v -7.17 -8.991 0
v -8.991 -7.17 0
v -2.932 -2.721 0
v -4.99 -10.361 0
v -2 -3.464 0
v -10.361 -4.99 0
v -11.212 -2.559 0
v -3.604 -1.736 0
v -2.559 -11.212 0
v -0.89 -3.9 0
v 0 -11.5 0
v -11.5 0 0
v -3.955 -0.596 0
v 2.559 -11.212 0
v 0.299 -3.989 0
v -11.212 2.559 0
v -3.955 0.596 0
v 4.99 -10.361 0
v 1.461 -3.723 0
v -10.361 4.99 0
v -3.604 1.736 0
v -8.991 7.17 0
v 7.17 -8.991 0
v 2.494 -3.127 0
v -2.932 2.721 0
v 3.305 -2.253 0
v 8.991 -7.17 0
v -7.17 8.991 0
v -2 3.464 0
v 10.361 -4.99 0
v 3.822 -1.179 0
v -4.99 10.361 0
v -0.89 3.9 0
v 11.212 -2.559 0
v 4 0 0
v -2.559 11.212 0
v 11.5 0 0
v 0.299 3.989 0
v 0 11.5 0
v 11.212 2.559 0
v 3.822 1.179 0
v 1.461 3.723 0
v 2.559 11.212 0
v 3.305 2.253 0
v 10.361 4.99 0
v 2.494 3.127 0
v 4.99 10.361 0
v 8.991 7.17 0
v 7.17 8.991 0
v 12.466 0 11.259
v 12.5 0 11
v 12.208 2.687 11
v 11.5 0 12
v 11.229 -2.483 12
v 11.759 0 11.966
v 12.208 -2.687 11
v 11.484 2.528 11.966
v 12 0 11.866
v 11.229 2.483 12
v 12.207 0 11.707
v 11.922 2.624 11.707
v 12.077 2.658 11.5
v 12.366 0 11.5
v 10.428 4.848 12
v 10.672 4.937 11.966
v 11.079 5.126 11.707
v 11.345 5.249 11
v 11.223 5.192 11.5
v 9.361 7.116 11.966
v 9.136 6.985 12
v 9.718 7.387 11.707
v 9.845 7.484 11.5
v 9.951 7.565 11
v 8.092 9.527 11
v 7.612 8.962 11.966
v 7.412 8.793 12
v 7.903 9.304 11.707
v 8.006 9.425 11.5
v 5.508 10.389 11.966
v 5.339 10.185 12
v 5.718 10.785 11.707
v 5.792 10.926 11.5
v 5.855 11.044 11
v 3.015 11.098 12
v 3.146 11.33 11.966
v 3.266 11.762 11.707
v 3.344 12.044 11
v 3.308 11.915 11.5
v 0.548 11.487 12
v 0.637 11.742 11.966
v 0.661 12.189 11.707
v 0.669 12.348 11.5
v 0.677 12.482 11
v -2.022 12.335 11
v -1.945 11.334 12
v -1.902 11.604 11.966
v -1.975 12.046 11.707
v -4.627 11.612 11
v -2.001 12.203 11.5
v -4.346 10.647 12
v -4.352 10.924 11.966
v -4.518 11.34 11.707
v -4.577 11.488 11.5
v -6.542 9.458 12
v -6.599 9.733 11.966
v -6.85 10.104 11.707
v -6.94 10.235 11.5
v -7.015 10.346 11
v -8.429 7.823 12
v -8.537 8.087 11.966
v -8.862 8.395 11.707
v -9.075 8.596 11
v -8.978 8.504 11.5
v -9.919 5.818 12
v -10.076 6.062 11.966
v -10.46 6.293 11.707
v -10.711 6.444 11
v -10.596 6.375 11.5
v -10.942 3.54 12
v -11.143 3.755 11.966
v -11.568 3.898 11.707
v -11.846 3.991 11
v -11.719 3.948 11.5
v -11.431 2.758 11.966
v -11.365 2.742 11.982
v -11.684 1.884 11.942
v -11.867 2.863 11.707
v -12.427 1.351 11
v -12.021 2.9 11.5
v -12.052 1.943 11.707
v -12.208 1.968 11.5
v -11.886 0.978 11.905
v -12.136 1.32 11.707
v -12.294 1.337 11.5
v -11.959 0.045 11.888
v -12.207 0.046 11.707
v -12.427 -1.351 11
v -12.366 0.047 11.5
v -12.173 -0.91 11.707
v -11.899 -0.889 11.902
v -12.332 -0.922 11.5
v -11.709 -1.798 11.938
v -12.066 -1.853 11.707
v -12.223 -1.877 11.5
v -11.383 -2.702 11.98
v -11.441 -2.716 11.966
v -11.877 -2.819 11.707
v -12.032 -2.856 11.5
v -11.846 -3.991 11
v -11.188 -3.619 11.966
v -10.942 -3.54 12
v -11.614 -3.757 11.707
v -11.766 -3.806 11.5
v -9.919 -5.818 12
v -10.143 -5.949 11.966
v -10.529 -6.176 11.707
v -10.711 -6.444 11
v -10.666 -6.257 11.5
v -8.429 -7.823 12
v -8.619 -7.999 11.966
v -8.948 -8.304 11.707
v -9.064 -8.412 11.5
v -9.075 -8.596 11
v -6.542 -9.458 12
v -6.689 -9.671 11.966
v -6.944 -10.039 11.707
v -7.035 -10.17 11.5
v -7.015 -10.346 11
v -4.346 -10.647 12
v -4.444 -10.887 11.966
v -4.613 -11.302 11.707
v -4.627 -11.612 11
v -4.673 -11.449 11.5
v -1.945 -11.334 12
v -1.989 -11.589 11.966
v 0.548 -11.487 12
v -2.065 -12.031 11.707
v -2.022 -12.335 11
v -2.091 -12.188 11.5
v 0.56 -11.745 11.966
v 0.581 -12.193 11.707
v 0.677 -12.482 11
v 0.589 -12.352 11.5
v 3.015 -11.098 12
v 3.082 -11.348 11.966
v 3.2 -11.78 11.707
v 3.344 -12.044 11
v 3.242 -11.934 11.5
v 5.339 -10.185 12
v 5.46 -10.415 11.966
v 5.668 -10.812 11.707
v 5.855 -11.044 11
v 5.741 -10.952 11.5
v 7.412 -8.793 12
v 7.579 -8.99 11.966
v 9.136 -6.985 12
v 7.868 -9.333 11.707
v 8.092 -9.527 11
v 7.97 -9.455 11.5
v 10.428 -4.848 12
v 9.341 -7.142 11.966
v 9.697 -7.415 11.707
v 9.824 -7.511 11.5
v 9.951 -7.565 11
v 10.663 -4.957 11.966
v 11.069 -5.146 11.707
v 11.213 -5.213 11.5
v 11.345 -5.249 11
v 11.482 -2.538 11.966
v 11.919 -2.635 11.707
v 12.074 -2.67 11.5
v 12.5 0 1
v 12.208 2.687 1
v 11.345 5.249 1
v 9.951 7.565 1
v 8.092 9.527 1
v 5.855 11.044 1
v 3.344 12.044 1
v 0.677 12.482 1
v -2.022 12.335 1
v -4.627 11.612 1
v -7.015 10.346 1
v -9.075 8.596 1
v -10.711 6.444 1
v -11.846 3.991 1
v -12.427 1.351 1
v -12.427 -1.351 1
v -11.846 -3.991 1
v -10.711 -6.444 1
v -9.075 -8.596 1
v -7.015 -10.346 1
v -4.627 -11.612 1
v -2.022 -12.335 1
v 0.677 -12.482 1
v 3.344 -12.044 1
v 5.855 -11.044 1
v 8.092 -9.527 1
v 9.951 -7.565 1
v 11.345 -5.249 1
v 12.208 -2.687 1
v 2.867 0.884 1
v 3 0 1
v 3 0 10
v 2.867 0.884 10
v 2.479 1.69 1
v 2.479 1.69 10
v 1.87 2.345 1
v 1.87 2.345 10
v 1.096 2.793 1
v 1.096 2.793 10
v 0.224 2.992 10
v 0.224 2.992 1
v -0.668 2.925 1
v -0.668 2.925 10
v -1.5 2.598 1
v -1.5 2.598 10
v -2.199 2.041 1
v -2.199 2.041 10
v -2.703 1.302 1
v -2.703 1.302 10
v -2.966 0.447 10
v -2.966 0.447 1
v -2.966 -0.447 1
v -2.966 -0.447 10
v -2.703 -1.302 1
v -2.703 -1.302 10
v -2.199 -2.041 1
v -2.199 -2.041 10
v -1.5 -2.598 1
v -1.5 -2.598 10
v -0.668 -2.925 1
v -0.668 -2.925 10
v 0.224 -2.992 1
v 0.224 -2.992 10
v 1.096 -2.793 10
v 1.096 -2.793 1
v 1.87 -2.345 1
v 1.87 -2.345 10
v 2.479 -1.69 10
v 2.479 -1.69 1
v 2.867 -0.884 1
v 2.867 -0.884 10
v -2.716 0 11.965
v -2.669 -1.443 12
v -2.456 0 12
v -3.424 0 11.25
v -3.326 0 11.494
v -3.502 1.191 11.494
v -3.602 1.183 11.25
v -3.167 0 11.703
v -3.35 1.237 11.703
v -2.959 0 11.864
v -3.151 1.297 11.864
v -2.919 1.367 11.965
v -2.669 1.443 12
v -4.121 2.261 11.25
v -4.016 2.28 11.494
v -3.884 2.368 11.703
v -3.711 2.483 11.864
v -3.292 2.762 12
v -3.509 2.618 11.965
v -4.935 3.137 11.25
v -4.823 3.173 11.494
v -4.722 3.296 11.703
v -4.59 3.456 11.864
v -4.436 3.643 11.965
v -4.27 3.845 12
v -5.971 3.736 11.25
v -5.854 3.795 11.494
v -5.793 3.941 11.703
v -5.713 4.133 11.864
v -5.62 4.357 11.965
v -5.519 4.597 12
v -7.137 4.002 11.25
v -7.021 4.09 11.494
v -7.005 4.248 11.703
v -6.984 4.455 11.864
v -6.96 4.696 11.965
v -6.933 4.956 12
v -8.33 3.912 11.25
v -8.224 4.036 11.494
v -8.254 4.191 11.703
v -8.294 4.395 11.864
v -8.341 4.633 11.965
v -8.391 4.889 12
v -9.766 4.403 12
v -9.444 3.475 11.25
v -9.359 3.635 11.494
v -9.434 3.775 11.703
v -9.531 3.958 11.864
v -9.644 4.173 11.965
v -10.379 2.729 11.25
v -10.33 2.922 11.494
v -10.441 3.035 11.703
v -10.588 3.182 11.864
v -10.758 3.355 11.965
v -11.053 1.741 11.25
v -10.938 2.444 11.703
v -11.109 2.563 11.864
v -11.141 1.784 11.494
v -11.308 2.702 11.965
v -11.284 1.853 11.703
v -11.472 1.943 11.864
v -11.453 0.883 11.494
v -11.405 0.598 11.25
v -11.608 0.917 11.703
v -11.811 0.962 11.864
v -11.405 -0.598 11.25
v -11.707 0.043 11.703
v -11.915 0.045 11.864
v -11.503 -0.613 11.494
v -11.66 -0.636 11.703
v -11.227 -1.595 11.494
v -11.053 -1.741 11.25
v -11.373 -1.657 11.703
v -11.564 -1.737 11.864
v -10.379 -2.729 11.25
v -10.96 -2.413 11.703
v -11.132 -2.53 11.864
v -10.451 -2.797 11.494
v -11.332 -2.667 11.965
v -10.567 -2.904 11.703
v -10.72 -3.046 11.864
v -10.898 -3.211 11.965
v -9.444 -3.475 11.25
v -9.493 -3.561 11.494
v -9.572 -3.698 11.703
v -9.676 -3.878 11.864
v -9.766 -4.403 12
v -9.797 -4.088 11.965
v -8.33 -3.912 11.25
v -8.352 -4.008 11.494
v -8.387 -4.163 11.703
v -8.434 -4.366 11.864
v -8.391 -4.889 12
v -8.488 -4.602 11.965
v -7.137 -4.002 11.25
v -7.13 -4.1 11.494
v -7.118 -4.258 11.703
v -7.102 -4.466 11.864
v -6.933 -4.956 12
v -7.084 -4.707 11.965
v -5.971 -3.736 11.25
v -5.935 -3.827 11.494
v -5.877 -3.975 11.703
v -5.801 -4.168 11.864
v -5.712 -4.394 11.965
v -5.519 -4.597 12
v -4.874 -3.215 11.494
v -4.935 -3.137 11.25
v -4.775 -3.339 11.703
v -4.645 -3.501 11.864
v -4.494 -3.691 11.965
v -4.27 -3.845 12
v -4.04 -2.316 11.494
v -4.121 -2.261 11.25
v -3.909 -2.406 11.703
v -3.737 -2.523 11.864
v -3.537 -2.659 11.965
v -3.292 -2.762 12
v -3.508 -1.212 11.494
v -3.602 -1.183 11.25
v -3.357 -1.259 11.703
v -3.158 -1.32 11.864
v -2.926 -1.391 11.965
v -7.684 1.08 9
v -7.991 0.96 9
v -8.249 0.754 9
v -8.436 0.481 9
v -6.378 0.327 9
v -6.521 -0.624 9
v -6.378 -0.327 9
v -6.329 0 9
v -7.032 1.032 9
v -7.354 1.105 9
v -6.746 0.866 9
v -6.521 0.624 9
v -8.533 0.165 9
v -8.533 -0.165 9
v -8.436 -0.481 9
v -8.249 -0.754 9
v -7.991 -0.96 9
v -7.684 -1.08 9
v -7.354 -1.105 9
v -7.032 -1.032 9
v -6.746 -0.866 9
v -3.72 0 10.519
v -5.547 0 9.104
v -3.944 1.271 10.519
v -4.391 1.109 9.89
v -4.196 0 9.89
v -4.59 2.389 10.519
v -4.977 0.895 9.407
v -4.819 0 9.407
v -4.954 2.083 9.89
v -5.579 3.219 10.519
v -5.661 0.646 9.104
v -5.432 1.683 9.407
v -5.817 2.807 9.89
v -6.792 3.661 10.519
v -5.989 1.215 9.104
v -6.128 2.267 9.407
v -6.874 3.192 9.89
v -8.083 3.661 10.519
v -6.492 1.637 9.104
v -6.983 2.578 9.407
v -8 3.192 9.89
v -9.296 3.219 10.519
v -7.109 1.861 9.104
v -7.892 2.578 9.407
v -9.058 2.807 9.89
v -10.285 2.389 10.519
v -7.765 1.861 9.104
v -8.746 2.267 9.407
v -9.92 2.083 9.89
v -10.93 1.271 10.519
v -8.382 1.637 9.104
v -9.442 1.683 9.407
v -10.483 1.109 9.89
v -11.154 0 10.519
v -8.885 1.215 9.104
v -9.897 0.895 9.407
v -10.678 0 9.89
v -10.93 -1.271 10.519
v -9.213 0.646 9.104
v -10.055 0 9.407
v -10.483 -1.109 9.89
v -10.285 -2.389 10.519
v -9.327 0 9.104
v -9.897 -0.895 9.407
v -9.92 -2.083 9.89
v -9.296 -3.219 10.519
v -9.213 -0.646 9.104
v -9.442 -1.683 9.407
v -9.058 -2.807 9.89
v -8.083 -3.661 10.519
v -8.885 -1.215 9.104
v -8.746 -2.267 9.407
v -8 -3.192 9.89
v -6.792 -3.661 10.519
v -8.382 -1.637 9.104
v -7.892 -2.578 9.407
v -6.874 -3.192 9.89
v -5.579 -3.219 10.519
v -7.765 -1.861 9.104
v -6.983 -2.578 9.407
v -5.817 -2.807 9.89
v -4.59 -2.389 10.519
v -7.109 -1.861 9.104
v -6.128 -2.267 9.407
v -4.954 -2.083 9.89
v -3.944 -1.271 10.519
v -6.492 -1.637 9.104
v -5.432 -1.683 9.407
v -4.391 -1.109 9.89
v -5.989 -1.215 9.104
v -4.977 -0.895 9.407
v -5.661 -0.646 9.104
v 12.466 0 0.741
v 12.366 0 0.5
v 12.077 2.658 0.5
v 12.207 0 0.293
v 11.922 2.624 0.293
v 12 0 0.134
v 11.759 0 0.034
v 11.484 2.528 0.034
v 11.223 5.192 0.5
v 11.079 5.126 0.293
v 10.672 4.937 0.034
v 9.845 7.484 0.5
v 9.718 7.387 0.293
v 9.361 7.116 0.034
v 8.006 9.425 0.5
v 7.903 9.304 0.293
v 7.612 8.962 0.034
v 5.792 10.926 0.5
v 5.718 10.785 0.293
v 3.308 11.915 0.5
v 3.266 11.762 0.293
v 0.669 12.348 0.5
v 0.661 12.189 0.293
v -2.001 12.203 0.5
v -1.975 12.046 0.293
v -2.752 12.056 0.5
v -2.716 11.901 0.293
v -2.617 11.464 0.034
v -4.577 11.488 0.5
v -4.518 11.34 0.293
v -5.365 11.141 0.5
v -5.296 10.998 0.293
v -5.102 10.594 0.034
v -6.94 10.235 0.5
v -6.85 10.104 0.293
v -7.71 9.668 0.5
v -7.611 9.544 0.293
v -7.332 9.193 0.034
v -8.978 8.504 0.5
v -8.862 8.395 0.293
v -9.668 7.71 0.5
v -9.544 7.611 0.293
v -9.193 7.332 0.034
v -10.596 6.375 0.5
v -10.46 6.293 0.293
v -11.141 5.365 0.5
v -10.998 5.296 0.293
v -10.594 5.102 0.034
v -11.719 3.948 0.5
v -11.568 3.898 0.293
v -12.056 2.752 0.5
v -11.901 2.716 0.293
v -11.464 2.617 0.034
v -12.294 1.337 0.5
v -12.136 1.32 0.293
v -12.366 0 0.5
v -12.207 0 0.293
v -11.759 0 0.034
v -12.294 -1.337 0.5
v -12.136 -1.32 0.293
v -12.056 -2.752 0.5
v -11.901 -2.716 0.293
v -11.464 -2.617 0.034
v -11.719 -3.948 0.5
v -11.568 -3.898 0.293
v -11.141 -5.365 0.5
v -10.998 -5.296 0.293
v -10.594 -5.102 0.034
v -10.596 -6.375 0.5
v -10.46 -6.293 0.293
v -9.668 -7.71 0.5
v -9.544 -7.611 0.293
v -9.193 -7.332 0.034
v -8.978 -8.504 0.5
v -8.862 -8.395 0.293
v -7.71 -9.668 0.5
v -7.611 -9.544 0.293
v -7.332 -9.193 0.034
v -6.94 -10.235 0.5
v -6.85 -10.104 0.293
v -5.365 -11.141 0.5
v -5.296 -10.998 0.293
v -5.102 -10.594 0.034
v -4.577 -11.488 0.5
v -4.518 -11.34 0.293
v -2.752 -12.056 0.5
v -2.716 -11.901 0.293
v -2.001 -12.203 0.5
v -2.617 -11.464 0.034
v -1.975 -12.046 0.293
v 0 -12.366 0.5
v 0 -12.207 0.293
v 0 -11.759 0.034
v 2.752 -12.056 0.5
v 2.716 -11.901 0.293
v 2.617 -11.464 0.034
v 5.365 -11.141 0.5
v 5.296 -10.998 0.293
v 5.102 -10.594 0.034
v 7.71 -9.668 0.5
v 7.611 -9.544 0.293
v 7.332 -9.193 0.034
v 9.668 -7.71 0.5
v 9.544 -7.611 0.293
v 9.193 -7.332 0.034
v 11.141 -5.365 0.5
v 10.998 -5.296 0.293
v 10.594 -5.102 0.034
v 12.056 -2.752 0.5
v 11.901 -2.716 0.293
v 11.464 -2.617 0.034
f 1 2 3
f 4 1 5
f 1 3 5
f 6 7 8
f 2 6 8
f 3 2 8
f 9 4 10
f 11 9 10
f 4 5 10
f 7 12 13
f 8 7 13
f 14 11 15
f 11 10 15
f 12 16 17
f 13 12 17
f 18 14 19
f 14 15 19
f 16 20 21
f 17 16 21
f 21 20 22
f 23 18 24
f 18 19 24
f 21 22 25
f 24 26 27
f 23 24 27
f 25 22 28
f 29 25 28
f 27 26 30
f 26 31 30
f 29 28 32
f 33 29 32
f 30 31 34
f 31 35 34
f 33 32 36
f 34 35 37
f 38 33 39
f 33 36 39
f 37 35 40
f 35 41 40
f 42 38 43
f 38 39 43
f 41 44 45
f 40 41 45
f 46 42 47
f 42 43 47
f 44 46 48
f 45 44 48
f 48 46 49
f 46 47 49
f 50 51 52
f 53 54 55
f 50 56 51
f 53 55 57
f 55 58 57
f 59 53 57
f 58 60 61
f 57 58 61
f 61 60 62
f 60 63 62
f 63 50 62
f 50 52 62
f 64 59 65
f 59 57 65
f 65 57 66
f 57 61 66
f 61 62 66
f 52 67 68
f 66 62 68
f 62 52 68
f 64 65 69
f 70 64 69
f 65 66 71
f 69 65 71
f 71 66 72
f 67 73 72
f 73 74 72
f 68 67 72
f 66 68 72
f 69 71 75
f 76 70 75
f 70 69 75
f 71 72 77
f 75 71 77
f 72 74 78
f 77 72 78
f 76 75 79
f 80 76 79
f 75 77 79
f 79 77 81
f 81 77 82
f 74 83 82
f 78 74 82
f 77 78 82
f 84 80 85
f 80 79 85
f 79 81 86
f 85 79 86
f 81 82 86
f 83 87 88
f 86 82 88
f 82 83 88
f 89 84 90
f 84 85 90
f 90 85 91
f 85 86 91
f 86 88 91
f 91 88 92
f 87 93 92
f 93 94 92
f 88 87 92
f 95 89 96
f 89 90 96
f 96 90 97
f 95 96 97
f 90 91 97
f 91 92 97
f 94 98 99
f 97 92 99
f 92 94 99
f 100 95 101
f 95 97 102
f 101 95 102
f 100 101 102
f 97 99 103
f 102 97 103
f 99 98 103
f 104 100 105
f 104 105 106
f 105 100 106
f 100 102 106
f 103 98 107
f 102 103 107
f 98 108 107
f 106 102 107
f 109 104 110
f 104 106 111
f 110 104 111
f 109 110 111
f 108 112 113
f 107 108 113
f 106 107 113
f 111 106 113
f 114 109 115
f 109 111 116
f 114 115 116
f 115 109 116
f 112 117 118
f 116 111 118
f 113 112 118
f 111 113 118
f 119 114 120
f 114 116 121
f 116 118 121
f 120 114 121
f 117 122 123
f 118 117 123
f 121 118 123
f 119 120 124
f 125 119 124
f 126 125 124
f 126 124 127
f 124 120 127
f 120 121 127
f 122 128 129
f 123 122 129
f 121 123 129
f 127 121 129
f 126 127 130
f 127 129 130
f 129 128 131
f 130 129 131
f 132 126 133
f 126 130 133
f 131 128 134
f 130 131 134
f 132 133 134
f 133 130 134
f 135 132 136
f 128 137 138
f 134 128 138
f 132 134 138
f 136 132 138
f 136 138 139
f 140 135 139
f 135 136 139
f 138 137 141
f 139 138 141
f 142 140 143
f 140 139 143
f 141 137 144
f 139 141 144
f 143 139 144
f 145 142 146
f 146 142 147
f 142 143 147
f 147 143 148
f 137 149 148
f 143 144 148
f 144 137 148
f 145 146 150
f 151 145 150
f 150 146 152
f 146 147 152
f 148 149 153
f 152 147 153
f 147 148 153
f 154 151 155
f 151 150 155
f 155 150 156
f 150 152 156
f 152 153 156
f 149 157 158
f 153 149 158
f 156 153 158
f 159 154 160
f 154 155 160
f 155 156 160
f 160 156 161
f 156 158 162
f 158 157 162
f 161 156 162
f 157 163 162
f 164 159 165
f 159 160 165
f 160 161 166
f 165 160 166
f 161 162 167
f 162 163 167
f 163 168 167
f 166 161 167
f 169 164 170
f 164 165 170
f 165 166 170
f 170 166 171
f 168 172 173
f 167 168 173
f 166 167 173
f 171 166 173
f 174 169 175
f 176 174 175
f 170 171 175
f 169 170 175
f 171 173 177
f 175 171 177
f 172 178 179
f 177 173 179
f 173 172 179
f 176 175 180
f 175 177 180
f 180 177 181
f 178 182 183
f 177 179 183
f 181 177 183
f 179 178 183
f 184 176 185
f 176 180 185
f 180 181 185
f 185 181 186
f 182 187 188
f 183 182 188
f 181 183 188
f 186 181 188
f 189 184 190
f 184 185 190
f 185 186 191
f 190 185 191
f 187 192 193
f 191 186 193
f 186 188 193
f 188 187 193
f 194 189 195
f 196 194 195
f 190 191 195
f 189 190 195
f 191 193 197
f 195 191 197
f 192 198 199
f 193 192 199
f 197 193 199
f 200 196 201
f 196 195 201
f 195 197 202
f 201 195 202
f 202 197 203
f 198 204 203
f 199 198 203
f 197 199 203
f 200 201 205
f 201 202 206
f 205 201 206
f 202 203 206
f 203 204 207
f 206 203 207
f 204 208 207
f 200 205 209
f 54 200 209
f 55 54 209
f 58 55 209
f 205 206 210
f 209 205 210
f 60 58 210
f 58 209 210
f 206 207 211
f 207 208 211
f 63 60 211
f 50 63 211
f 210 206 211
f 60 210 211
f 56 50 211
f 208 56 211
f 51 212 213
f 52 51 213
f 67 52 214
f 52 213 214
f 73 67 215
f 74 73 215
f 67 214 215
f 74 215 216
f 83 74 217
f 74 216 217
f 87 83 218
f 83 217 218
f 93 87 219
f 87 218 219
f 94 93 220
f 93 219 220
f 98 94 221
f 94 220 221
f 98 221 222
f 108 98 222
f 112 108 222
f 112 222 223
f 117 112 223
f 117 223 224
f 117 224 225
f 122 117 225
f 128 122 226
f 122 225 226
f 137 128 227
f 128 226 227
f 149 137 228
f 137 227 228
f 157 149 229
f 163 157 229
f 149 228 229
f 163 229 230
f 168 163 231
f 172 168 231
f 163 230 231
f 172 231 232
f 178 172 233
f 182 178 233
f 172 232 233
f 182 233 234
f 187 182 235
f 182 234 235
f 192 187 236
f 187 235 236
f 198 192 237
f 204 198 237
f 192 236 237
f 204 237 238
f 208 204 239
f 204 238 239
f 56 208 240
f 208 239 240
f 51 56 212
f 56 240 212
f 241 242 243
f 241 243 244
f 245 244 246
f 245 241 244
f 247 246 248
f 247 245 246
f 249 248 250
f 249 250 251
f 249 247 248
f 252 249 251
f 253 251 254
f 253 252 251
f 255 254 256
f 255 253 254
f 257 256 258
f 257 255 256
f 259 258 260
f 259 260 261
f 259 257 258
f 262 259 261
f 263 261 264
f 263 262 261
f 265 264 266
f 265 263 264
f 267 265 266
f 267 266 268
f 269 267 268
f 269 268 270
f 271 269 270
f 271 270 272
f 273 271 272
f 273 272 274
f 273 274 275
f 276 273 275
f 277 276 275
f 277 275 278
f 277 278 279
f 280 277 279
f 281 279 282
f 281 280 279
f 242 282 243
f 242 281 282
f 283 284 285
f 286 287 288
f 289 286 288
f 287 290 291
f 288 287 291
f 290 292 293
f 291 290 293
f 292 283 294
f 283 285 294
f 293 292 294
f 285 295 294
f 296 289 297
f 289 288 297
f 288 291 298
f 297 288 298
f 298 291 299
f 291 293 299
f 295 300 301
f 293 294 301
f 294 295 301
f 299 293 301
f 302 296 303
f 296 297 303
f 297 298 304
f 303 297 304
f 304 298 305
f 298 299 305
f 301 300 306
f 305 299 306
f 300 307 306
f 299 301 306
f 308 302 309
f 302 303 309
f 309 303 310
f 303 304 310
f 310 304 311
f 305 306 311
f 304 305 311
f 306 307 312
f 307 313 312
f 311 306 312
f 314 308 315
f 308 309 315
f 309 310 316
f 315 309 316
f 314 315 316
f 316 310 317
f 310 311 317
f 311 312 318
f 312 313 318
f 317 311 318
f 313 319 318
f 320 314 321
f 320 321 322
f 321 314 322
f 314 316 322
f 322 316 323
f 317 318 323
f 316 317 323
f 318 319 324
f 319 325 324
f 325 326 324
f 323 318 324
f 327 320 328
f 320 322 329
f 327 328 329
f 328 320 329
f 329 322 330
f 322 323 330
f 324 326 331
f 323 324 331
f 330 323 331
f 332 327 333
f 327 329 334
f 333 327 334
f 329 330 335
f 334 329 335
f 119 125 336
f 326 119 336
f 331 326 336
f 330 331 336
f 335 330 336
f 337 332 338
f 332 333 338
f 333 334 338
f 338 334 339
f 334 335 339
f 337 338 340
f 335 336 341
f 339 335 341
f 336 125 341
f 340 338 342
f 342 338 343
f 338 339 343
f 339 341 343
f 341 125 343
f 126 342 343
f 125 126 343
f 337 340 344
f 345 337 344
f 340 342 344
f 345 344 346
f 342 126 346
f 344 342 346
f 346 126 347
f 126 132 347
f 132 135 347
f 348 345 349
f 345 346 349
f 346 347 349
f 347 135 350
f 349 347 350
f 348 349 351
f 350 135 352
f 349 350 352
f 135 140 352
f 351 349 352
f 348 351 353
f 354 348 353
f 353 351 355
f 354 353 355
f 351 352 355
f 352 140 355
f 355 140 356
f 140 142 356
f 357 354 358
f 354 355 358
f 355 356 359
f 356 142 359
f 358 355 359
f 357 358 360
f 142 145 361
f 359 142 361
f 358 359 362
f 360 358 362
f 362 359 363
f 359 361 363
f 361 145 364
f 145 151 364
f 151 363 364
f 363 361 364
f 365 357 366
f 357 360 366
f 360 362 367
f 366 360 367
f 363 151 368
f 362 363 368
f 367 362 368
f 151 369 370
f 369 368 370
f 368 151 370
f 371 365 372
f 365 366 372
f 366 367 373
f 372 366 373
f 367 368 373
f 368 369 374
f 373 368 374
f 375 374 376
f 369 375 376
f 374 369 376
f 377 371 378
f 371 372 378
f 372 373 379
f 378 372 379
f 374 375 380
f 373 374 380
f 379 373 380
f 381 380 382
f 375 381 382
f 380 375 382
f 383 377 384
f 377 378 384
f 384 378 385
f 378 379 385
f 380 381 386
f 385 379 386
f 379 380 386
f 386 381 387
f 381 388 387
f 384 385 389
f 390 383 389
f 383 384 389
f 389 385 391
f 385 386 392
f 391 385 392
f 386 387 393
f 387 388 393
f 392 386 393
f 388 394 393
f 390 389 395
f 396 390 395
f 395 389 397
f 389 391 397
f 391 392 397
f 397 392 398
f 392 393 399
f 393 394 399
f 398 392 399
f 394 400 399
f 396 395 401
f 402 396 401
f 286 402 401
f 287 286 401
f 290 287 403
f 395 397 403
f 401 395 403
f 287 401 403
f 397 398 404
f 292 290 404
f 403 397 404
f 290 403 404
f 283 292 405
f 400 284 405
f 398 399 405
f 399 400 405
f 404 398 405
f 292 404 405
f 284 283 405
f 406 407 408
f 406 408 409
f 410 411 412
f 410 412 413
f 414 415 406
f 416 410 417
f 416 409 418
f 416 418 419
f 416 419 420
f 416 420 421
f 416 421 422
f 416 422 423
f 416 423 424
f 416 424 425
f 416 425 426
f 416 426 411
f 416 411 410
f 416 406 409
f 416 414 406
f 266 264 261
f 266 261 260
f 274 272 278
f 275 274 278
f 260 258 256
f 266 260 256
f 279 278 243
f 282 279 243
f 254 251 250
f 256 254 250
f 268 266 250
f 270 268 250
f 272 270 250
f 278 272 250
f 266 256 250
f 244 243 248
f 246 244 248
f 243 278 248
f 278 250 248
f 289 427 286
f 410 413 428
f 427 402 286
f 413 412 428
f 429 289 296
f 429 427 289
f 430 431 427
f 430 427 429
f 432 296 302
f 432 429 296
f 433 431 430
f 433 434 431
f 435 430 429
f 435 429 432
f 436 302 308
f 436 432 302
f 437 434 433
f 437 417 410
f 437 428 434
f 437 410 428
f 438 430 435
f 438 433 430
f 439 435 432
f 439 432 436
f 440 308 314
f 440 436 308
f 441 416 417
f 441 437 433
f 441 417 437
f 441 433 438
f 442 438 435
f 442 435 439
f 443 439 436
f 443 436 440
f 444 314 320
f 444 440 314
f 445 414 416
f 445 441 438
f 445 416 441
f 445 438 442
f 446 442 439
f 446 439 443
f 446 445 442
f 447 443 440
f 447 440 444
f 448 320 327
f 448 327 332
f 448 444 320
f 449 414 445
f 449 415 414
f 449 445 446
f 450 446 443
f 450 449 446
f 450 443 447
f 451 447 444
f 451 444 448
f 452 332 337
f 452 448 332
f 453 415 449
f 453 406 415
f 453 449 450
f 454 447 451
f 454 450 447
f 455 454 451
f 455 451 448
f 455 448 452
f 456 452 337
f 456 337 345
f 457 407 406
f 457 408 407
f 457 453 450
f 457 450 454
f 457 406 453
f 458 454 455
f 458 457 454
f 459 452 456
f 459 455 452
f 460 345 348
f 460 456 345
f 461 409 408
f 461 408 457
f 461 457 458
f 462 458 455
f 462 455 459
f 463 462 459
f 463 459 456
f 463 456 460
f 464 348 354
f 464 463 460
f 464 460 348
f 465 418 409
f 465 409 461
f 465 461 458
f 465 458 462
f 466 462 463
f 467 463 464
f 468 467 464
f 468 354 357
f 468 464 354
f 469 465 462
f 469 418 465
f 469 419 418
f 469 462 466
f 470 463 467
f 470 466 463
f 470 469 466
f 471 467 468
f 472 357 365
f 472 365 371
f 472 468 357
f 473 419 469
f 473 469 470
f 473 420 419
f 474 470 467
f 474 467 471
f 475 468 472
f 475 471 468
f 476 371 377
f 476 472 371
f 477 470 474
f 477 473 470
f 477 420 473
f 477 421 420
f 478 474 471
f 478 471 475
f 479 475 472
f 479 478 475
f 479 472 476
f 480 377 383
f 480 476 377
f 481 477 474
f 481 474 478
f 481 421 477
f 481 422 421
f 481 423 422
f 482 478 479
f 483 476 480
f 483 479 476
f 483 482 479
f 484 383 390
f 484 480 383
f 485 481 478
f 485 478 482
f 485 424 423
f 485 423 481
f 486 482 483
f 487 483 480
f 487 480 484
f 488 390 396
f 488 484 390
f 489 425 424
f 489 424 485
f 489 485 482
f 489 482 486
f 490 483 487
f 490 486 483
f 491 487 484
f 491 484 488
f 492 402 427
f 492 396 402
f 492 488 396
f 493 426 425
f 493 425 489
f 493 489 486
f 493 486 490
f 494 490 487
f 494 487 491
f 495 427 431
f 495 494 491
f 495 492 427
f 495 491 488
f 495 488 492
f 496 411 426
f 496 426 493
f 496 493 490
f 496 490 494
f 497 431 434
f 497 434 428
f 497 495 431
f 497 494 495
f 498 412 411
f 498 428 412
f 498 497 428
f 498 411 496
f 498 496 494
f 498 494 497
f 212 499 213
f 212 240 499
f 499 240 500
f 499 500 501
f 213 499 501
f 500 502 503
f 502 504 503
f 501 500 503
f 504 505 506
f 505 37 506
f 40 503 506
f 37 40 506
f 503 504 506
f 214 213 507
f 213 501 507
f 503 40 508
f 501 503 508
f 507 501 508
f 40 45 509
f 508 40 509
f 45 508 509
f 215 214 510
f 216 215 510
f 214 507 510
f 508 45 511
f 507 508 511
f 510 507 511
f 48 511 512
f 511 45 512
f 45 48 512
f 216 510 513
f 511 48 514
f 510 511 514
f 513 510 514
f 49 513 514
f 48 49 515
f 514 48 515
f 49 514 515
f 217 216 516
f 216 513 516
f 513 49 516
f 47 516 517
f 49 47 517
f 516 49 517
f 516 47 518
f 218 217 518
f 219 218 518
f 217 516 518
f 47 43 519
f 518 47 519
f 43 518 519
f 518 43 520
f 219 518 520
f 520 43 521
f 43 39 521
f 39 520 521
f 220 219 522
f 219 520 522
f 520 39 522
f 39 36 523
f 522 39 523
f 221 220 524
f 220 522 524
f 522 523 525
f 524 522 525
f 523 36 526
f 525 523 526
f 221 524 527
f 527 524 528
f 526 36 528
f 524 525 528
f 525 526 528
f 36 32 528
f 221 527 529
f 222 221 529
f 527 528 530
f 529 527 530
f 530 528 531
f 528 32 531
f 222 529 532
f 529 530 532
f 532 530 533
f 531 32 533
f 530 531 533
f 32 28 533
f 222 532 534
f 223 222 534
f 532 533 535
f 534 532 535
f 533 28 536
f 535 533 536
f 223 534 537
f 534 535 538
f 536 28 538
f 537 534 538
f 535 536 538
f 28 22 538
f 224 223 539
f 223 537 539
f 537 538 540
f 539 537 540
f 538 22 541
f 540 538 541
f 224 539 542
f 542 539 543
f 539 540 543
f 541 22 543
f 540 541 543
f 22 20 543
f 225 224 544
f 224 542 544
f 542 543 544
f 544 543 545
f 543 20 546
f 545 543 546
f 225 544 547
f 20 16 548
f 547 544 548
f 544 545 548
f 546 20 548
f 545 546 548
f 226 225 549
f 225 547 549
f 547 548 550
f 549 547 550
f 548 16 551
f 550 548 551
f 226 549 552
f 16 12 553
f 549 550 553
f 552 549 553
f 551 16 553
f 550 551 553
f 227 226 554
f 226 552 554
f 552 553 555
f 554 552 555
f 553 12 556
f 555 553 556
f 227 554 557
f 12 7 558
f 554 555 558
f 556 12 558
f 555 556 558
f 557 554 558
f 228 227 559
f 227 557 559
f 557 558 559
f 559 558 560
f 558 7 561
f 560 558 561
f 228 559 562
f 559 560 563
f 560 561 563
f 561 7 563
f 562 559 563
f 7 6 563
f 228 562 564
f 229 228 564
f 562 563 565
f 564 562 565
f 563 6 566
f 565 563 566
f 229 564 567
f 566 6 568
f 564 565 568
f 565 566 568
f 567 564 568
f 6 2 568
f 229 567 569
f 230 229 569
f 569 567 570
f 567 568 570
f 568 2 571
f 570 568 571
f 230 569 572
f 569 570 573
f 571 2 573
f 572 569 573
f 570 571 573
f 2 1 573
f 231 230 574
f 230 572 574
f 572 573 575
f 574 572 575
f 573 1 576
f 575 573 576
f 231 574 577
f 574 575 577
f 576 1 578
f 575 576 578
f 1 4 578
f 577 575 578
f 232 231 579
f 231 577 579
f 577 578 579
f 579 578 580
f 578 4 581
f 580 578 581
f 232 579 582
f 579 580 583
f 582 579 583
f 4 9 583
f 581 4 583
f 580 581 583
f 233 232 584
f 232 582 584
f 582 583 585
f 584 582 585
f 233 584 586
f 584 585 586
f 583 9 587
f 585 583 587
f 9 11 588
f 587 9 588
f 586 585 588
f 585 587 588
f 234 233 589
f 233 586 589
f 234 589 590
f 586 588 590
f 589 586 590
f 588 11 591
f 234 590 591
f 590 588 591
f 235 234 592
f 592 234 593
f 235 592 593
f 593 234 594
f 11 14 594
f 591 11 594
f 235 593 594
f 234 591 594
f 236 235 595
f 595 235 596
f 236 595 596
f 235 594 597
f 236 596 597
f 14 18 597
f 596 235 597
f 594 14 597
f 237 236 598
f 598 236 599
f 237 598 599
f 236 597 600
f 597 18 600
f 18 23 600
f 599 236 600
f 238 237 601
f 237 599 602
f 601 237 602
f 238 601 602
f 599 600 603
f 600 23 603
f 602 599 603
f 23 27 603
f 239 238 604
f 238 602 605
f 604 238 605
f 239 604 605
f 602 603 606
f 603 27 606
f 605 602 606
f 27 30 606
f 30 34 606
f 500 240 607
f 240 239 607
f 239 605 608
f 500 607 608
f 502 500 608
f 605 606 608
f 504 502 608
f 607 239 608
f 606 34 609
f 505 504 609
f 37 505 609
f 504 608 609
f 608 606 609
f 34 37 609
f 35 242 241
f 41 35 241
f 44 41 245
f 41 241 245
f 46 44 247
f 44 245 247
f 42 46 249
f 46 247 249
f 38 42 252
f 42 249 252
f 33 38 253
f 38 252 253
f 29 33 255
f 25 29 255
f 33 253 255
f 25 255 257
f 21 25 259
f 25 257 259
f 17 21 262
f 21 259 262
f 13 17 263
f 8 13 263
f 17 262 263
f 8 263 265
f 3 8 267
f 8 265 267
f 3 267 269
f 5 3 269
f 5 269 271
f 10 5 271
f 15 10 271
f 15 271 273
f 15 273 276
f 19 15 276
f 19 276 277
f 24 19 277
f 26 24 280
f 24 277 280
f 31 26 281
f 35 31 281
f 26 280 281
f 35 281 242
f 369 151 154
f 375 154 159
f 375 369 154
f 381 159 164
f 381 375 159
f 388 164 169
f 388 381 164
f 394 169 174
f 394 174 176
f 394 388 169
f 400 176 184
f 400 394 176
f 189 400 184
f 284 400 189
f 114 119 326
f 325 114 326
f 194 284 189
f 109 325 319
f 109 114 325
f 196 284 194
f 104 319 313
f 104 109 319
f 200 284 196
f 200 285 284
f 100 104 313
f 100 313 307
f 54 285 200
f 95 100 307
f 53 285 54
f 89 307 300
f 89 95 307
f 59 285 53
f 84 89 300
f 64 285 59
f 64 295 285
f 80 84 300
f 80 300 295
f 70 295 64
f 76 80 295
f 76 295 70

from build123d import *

# Parameters (mm, degrees)
F0_R     = 12.5
F0_R_2   = 3
F1_DEPTH = 10
F2_R     = 12.5
F2_R_2   = 3
F3_DEPTH = 2
F4_R     = 4.1082069006
F5_DEPTH = 3
F6_R     = 2.99999
F8_R     = 1
F9_SIZE  = 1


# Not quite as in the source:
# - a fillet or chamfer that OpenCascade refuses, or shapes differently, is made with other operations: its cross-section is extruded or revolved along the edge and cut away or added
# - a fillet or chamfer is up to 0.001 mm smaller than in the source, because OpenCascade refuses the exact size


with BuildPart() as f1:
    # F0 (on Top) → F1 (new body)
    with BuildSketch(Plane.XY):
        Circle(F0_R)
        Circle(F0_R_2, mode=Mode.SUBTRACT)
    extrude(amount=F1_DEPTH)

    # F2 (on face) → F3 (join)
    with BuildSketch(Plane.XY.offset(10)):
        Circle(F2_R)
        Circle(F2_R_2, mode=Mode.SUBTRACT)
        Circle(F2_R_2)
    extrude(amount=F3_DEPTH)

    # F4 (on face) → F5 (cut)
    with BuildSketch(Plane.XY.offset(12)):
        with Locations((-7.4370889924, 0)):
            Circle(F4_R)
    extrude(amount=-F5_DEPTH, mode=Mode.SUBTRACT)

    # F6 (radius 3 in the source; OpenCascade refuses exactly that, so slightly less here)
    f6_edges = [f1.edges().sort_by_distance(p)[0] for p in [
        (-11.545296, 0, 9),
    ]]
    fillet(f6_edges, radius=F6_R)

    # F7: fillet of radius 1 on 2 edges, made by hand

    # F7_s1 → F7_t2 (revolve, cut)
    with BuildSketch(Plane.XZ):
        with BuildLine():
            ThreePointArc((11.5, 12), (12.2071067812, 11.7071067812), (12.5, 11))
            Line((12.5, 11), (12.5, 12))
            Line((12.5, 12), (11.5, 12))
        make_face()
    revolve(axis=Axis((0, 0, 12), (0, 0, 1)), mode=Mode.SUBTRACT)

    # F7_s3 → F7_t4 (revolve, cut)
    with BuildSketch(Plane.XZ):
        with BuildLine():
            ThreePointArc((-3.4241428123, 11.249998125), (-3.0682696928, 11.7905688221), (-2.4558964916, 12))
            Line((-2.4558964916, 12), (-2.4558964916, 12.1))
            Line((-2.4558964916, 12.1), (-3.3288820918, 12.1))
            Line((-3.3288820918, 12.1), (-3.4288820918, 12))
            ThreePointArc((-3.4288820918, 12), (-3.4288820918, 11.99999), (-3.5209674443, 11.2749979375))
            Line((-3.5209674443, 11.2749979375), (-3.4241428123, 11.249998125))
        make_face()
    revolve(axis=Axis((-7.4370889924, 0, 12), (0, 0, 1)), mode=Mode.SUBTRACT)

    # F8
    f8_edges = [f1.edges().sort_by_distance(p)[0] for p in [
        (-12.5, 0, 0),
    ]]
    fillet(f8_edges, radius=F8_R)

    # F9
    f9_edges = [f1.edges().sort_by_distance(p)[0] for p in [
        (-3, 0, 0),
    ]]
    chamfer(f9_edges, length=F9_SIZE)


solid = f1.part
